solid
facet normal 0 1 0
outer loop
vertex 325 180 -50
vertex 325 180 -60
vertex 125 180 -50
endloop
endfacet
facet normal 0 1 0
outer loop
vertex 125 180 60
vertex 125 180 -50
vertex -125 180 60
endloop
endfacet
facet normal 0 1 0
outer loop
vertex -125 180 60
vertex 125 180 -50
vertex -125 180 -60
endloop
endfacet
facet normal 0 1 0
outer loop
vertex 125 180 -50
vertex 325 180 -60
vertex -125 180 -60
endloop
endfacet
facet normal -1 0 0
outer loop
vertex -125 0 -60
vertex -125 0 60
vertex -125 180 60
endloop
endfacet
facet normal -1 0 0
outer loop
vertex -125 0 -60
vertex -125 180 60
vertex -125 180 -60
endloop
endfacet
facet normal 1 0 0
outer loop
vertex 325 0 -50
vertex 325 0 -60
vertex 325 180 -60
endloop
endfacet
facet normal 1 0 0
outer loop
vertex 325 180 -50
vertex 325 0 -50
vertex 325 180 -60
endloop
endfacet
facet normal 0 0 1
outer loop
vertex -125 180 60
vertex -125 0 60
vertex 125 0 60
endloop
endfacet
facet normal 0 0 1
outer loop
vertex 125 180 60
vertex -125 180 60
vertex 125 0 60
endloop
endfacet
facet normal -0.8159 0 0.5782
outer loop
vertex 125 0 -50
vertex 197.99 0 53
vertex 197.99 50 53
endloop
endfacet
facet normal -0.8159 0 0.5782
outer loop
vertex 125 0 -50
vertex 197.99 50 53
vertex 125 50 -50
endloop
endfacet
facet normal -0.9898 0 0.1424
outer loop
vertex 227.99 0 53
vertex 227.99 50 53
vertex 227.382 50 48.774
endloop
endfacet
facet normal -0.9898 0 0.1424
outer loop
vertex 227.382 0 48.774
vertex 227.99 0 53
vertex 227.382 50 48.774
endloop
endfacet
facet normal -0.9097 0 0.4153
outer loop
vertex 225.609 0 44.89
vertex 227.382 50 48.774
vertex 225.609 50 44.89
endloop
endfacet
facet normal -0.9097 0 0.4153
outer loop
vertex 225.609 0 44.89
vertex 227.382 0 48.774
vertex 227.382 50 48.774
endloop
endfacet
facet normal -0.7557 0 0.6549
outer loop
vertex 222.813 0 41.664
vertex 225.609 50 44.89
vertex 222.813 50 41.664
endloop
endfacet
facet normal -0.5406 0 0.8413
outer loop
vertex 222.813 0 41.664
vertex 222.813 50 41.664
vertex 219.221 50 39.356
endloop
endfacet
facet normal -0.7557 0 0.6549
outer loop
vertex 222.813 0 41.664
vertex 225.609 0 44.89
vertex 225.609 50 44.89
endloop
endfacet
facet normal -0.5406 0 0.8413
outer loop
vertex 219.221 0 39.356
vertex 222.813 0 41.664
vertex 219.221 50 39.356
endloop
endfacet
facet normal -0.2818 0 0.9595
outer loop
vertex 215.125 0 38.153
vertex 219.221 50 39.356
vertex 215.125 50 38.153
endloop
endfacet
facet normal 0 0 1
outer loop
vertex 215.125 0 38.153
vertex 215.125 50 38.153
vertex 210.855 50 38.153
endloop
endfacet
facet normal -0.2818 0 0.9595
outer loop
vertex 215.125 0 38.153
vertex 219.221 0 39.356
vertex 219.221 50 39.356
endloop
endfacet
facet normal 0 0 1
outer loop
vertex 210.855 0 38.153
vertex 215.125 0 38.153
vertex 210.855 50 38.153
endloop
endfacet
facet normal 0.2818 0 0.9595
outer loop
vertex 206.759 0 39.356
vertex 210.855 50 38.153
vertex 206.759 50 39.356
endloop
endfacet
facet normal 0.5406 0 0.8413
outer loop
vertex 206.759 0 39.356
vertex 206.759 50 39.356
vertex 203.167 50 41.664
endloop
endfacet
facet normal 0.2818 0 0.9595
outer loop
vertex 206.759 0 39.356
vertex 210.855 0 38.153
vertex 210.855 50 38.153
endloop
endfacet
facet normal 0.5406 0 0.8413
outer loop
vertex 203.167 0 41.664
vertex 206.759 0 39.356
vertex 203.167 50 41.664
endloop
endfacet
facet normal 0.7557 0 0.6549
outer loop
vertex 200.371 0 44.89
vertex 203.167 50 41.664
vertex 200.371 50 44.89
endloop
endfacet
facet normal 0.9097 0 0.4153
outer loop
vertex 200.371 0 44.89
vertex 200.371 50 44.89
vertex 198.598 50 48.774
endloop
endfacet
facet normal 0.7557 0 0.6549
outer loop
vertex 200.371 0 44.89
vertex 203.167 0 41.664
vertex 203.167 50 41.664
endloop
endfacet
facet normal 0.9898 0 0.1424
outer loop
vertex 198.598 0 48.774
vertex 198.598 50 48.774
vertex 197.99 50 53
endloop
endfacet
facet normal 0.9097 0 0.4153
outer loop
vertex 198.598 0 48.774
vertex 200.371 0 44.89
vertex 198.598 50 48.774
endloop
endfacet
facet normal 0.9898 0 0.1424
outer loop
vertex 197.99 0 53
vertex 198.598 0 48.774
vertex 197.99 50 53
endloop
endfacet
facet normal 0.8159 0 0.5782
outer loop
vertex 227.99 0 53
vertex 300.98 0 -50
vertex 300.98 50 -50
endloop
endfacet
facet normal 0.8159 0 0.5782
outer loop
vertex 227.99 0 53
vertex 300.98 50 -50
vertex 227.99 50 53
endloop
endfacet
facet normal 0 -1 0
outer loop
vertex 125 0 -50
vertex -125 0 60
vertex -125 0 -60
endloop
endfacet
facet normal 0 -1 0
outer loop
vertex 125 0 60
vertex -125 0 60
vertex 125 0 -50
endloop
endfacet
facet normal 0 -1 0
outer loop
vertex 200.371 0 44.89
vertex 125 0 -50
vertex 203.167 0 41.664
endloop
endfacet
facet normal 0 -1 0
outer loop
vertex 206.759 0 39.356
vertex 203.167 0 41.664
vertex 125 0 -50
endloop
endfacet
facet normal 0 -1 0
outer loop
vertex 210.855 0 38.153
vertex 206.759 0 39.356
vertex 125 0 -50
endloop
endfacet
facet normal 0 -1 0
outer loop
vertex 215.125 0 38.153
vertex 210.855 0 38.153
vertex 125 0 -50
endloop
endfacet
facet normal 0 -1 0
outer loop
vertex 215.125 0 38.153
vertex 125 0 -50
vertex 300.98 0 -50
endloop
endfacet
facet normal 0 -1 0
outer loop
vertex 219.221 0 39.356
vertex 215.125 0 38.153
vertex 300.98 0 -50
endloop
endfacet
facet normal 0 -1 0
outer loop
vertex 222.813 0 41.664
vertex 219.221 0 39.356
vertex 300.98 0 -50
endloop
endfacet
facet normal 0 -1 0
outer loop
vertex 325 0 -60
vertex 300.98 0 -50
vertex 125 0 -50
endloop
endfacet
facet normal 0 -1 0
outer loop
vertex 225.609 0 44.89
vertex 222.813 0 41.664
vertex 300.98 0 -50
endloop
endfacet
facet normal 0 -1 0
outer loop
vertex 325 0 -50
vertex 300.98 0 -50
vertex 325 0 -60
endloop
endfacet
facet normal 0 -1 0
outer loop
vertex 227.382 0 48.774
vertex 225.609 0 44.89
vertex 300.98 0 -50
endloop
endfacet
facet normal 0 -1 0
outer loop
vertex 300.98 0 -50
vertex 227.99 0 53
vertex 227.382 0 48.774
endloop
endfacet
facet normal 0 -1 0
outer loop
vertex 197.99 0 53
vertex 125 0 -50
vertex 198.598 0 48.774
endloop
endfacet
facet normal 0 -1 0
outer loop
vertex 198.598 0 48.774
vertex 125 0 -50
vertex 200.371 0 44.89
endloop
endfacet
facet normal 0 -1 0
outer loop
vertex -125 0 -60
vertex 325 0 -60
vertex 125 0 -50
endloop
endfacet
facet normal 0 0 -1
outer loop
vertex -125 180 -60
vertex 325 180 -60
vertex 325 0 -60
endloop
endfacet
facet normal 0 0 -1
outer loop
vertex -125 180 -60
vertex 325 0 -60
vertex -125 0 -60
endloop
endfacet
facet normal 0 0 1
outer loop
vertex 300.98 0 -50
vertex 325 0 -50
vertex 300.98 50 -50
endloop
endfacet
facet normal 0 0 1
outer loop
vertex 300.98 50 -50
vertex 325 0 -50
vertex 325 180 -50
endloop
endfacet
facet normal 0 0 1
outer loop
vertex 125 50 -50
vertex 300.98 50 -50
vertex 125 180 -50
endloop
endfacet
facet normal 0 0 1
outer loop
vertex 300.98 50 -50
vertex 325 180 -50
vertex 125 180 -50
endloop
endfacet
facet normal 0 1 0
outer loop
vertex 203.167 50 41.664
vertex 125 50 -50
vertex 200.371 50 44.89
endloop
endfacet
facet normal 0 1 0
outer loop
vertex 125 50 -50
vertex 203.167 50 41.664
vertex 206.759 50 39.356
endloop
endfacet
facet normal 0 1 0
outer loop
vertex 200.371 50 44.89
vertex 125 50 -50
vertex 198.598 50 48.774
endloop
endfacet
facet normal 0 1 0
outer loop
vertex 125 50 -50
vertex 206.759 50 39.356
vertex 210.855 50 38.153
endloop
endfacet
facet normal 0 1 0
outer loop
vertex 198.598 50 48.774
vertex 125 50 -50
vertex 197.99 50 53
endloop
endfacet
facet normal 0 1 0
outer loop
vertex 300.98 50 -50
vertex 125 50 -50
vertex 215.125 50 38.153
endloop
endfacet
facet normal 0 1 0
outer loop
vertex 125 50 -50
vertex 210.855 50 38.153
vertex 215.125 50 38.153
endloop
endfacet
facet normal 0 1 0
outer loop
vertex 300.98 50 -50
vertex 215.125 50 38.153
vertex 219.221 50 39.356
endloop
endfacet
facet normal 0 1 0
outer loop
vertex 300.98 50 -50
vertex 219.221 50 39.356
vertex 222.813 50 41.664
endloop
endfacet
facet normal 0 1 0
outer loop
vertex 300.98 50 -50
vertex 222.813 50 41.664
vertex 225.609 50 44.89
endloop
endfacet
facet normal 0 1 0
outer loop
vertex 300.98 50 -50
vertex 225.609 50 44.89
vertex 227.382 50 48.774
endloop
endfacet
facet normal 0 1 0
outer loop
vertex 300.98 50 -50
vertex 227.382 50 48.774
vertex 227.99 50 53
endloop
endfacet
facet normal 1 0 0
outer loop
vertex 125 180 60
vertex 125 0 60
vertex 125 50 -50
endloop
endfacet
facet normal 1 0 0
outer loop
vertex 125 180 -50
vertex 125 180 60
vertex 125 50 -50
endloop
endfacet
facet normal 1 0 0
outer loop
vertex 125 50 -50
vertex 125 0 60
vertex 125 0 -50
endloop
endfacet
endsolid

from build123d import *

# Parameters (mm, degrees)
SKETCH2_W           = 250
SKETCH2_H           = 120
BOSS_EXTRUDE1_DEPTH = 180
SKETCH3_W           = 450
SKETCH3_H           = 180
BOSS_EXTRUDE2_DEPTH = 10
BOSS_EXTRUDE3_DEPTH = 50


with BuildPart() as part:
    # Sketch2 → Boss-Extrude1 (new body)
    with BuildSketch(Plane(origin=(0, 0, 0), x_dir=(1, 0, 0), z_dir=(0, 1, 0))):
        Rectangle(SKETCH2_W, SKETCH2_H)
    extrude(amount=BOSS_EXTRUDE1_DEPTH)

    # Sketch3 → Boss-Extrude2 (add)
    with BuildSketch(Plane(origin=(0, 0, -60), x_dir=(-1, 0, 0), z_dir=(0, 0, -1))):
        with Locations((-100, 90)):
            Rectangle(SKETCH3_W, SKETCH3_H)
    extrude(amount=-BOSS_EXTRUDE2_DEPTH)

    # Sketch4 → Boss-Extrude3 (add)
    with BuildSketch(Plane.XZ):
        with BuildLine():
            Line((125, -50), (300.98, -50))
            Line((300.98, -50), (227.99, 53))
            ThreePointArc((227.99, 53), (212.99, 38), (197.99, 53))
            Line((197.99, 53), (125, -50))
        make_face()
    extrude(amount=-BOSS_EXTRUDE3_DEPTH)


solid = part.part
